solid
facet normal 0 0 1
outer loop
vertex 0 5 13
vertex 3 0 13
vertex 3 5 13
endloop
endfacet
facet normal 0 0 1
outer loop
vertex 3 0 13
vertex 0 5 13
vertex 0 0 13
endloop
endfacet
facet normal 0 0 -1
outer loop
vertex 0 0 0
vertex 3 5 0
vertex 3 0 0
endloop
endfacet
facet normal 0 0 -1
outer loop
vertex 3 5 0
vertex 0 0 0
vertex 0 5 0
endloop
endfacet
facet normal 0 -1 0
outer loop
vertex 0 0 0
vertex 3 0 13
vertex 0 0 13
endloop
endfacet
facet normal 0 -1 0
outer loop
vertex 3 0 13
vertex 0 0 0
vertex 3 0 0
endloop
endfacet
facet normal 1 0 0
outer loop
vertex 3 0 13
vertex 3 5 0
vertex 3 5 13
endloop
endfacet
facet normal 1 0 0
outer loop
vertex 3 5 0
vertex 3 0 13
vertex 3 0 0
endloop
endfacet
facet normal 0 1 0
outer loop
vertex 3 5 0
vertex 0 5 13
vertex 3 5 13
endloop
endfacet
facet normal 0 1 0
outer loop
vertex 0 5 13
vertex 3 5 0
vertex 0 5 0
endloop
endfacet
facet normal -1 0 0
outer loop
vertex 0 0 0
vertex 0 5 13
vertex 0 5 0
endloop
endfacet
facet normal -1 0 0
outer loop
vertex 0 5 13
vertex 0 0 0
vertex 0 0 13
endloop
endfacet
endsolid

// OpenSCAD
// Generated by SolidPython 1.0.1 on 2020-07-29 00:39:26


cube(size = [3, 5, 13]);
/***********************************************
*********      SolidPython code:      **********
************************************************
 
# import packages: SolidPython
from solid import *
from solid.utils import *
from itertools import chain, combinations


class Resize:

    def __init__(self, scad_file):
        self.scad_file = scad_file
        #self.scad_file = import_scad(scad_file)
        # cone/cylinder param:
        self.r1 = 0
        self.r2 = 0
        self.h = 0
        # rectangular prism param:
        self.w = 0
        self.l = 0
        # ellipse param:
        self.r = 0

    # import OpenScad code (file name corresponds to shape)


    # classify shape + parameters
    def assign(self, param1, param2, param3):
        if self.scad_file == 'cone.scad':
            self.r1 = param1
            self.r2 = param2
            self.h = param3
        elif self.scad_file == 'cylinder.scad':
            self.r1 = param1
            self.r2 = param2
            self.h = param3
        elif self.scad_file == 'rectangularPrism.scad':
            self.h = param1
            self.l = param2
            self.w = param3
        else:
            self.r = param1
            self.h = param2

    # resize parameters
    def iterate(self):
        x = range(3, 20, 2)
        i = 1
        if self.scad_file == 'cone.scad':
            tempList = list(combinations(x, 2))
            for temp in tempList:
                param1 = temp[0]
                param2 = temp[1]
                filepath = 'produced_scad_files/' + 'cone' + str(param1) + '_' + str(param2) + '_' + '.scad'
                scad_render_to_file(cylinder(h=param1, r1=param2, r2=0), filepath)

        elif self.scad_file == 'cylinder.scad':
            tempList = list(combinations(x, 3))
            for temp in tempList:
                param1 = temp[0]
                param2 = temp[1]
                filepath = 'produced_scad_files/' + 'cylinder' + str(param1) + '_' + str(param2) + '_' + '.scad'
                scad_render_to_file(cylinder(h=param1, r1=param2, r2=param2), filepath)

        elif self.scad_file == 'rectangularPrism.scad':
            tempList = list(combinations(x, 3))
            for temp in tempList:
                param1 = temp[0]
                param2 = temp[1]
                param3 = temp[2]
                filepath = 'produced_scad_files/' + 'rectangularPrism' + str(param1) + '_' + str(param2) + '_' + str(
                    param3) + '.scad'
                scad_render_to_file(cube(size=(param1, param2, param3)), filepath)

        elif self.scad_file == 'ellipse.scad':
            tempList = list(combinations(x, 4))
            for temp in tempList:
                param1 = temp[0]
                param2 = temp[1]
                param3 = temp[2]
                param4 = temp[3]
                filepath = 'produced_scad_files/' + 'ellipse' + str(param1) + '_' + str(param2) + '_' + str(param3) + '_' + str(param4) + '.scad'
                scad_render_to_file(scale([param1, param2, param3])(sphere(r=param4)), filepath)

    def render_to_scadfile(self):
        scad_render_to_file(scad, 'example.scad') 
 
************************************************/
